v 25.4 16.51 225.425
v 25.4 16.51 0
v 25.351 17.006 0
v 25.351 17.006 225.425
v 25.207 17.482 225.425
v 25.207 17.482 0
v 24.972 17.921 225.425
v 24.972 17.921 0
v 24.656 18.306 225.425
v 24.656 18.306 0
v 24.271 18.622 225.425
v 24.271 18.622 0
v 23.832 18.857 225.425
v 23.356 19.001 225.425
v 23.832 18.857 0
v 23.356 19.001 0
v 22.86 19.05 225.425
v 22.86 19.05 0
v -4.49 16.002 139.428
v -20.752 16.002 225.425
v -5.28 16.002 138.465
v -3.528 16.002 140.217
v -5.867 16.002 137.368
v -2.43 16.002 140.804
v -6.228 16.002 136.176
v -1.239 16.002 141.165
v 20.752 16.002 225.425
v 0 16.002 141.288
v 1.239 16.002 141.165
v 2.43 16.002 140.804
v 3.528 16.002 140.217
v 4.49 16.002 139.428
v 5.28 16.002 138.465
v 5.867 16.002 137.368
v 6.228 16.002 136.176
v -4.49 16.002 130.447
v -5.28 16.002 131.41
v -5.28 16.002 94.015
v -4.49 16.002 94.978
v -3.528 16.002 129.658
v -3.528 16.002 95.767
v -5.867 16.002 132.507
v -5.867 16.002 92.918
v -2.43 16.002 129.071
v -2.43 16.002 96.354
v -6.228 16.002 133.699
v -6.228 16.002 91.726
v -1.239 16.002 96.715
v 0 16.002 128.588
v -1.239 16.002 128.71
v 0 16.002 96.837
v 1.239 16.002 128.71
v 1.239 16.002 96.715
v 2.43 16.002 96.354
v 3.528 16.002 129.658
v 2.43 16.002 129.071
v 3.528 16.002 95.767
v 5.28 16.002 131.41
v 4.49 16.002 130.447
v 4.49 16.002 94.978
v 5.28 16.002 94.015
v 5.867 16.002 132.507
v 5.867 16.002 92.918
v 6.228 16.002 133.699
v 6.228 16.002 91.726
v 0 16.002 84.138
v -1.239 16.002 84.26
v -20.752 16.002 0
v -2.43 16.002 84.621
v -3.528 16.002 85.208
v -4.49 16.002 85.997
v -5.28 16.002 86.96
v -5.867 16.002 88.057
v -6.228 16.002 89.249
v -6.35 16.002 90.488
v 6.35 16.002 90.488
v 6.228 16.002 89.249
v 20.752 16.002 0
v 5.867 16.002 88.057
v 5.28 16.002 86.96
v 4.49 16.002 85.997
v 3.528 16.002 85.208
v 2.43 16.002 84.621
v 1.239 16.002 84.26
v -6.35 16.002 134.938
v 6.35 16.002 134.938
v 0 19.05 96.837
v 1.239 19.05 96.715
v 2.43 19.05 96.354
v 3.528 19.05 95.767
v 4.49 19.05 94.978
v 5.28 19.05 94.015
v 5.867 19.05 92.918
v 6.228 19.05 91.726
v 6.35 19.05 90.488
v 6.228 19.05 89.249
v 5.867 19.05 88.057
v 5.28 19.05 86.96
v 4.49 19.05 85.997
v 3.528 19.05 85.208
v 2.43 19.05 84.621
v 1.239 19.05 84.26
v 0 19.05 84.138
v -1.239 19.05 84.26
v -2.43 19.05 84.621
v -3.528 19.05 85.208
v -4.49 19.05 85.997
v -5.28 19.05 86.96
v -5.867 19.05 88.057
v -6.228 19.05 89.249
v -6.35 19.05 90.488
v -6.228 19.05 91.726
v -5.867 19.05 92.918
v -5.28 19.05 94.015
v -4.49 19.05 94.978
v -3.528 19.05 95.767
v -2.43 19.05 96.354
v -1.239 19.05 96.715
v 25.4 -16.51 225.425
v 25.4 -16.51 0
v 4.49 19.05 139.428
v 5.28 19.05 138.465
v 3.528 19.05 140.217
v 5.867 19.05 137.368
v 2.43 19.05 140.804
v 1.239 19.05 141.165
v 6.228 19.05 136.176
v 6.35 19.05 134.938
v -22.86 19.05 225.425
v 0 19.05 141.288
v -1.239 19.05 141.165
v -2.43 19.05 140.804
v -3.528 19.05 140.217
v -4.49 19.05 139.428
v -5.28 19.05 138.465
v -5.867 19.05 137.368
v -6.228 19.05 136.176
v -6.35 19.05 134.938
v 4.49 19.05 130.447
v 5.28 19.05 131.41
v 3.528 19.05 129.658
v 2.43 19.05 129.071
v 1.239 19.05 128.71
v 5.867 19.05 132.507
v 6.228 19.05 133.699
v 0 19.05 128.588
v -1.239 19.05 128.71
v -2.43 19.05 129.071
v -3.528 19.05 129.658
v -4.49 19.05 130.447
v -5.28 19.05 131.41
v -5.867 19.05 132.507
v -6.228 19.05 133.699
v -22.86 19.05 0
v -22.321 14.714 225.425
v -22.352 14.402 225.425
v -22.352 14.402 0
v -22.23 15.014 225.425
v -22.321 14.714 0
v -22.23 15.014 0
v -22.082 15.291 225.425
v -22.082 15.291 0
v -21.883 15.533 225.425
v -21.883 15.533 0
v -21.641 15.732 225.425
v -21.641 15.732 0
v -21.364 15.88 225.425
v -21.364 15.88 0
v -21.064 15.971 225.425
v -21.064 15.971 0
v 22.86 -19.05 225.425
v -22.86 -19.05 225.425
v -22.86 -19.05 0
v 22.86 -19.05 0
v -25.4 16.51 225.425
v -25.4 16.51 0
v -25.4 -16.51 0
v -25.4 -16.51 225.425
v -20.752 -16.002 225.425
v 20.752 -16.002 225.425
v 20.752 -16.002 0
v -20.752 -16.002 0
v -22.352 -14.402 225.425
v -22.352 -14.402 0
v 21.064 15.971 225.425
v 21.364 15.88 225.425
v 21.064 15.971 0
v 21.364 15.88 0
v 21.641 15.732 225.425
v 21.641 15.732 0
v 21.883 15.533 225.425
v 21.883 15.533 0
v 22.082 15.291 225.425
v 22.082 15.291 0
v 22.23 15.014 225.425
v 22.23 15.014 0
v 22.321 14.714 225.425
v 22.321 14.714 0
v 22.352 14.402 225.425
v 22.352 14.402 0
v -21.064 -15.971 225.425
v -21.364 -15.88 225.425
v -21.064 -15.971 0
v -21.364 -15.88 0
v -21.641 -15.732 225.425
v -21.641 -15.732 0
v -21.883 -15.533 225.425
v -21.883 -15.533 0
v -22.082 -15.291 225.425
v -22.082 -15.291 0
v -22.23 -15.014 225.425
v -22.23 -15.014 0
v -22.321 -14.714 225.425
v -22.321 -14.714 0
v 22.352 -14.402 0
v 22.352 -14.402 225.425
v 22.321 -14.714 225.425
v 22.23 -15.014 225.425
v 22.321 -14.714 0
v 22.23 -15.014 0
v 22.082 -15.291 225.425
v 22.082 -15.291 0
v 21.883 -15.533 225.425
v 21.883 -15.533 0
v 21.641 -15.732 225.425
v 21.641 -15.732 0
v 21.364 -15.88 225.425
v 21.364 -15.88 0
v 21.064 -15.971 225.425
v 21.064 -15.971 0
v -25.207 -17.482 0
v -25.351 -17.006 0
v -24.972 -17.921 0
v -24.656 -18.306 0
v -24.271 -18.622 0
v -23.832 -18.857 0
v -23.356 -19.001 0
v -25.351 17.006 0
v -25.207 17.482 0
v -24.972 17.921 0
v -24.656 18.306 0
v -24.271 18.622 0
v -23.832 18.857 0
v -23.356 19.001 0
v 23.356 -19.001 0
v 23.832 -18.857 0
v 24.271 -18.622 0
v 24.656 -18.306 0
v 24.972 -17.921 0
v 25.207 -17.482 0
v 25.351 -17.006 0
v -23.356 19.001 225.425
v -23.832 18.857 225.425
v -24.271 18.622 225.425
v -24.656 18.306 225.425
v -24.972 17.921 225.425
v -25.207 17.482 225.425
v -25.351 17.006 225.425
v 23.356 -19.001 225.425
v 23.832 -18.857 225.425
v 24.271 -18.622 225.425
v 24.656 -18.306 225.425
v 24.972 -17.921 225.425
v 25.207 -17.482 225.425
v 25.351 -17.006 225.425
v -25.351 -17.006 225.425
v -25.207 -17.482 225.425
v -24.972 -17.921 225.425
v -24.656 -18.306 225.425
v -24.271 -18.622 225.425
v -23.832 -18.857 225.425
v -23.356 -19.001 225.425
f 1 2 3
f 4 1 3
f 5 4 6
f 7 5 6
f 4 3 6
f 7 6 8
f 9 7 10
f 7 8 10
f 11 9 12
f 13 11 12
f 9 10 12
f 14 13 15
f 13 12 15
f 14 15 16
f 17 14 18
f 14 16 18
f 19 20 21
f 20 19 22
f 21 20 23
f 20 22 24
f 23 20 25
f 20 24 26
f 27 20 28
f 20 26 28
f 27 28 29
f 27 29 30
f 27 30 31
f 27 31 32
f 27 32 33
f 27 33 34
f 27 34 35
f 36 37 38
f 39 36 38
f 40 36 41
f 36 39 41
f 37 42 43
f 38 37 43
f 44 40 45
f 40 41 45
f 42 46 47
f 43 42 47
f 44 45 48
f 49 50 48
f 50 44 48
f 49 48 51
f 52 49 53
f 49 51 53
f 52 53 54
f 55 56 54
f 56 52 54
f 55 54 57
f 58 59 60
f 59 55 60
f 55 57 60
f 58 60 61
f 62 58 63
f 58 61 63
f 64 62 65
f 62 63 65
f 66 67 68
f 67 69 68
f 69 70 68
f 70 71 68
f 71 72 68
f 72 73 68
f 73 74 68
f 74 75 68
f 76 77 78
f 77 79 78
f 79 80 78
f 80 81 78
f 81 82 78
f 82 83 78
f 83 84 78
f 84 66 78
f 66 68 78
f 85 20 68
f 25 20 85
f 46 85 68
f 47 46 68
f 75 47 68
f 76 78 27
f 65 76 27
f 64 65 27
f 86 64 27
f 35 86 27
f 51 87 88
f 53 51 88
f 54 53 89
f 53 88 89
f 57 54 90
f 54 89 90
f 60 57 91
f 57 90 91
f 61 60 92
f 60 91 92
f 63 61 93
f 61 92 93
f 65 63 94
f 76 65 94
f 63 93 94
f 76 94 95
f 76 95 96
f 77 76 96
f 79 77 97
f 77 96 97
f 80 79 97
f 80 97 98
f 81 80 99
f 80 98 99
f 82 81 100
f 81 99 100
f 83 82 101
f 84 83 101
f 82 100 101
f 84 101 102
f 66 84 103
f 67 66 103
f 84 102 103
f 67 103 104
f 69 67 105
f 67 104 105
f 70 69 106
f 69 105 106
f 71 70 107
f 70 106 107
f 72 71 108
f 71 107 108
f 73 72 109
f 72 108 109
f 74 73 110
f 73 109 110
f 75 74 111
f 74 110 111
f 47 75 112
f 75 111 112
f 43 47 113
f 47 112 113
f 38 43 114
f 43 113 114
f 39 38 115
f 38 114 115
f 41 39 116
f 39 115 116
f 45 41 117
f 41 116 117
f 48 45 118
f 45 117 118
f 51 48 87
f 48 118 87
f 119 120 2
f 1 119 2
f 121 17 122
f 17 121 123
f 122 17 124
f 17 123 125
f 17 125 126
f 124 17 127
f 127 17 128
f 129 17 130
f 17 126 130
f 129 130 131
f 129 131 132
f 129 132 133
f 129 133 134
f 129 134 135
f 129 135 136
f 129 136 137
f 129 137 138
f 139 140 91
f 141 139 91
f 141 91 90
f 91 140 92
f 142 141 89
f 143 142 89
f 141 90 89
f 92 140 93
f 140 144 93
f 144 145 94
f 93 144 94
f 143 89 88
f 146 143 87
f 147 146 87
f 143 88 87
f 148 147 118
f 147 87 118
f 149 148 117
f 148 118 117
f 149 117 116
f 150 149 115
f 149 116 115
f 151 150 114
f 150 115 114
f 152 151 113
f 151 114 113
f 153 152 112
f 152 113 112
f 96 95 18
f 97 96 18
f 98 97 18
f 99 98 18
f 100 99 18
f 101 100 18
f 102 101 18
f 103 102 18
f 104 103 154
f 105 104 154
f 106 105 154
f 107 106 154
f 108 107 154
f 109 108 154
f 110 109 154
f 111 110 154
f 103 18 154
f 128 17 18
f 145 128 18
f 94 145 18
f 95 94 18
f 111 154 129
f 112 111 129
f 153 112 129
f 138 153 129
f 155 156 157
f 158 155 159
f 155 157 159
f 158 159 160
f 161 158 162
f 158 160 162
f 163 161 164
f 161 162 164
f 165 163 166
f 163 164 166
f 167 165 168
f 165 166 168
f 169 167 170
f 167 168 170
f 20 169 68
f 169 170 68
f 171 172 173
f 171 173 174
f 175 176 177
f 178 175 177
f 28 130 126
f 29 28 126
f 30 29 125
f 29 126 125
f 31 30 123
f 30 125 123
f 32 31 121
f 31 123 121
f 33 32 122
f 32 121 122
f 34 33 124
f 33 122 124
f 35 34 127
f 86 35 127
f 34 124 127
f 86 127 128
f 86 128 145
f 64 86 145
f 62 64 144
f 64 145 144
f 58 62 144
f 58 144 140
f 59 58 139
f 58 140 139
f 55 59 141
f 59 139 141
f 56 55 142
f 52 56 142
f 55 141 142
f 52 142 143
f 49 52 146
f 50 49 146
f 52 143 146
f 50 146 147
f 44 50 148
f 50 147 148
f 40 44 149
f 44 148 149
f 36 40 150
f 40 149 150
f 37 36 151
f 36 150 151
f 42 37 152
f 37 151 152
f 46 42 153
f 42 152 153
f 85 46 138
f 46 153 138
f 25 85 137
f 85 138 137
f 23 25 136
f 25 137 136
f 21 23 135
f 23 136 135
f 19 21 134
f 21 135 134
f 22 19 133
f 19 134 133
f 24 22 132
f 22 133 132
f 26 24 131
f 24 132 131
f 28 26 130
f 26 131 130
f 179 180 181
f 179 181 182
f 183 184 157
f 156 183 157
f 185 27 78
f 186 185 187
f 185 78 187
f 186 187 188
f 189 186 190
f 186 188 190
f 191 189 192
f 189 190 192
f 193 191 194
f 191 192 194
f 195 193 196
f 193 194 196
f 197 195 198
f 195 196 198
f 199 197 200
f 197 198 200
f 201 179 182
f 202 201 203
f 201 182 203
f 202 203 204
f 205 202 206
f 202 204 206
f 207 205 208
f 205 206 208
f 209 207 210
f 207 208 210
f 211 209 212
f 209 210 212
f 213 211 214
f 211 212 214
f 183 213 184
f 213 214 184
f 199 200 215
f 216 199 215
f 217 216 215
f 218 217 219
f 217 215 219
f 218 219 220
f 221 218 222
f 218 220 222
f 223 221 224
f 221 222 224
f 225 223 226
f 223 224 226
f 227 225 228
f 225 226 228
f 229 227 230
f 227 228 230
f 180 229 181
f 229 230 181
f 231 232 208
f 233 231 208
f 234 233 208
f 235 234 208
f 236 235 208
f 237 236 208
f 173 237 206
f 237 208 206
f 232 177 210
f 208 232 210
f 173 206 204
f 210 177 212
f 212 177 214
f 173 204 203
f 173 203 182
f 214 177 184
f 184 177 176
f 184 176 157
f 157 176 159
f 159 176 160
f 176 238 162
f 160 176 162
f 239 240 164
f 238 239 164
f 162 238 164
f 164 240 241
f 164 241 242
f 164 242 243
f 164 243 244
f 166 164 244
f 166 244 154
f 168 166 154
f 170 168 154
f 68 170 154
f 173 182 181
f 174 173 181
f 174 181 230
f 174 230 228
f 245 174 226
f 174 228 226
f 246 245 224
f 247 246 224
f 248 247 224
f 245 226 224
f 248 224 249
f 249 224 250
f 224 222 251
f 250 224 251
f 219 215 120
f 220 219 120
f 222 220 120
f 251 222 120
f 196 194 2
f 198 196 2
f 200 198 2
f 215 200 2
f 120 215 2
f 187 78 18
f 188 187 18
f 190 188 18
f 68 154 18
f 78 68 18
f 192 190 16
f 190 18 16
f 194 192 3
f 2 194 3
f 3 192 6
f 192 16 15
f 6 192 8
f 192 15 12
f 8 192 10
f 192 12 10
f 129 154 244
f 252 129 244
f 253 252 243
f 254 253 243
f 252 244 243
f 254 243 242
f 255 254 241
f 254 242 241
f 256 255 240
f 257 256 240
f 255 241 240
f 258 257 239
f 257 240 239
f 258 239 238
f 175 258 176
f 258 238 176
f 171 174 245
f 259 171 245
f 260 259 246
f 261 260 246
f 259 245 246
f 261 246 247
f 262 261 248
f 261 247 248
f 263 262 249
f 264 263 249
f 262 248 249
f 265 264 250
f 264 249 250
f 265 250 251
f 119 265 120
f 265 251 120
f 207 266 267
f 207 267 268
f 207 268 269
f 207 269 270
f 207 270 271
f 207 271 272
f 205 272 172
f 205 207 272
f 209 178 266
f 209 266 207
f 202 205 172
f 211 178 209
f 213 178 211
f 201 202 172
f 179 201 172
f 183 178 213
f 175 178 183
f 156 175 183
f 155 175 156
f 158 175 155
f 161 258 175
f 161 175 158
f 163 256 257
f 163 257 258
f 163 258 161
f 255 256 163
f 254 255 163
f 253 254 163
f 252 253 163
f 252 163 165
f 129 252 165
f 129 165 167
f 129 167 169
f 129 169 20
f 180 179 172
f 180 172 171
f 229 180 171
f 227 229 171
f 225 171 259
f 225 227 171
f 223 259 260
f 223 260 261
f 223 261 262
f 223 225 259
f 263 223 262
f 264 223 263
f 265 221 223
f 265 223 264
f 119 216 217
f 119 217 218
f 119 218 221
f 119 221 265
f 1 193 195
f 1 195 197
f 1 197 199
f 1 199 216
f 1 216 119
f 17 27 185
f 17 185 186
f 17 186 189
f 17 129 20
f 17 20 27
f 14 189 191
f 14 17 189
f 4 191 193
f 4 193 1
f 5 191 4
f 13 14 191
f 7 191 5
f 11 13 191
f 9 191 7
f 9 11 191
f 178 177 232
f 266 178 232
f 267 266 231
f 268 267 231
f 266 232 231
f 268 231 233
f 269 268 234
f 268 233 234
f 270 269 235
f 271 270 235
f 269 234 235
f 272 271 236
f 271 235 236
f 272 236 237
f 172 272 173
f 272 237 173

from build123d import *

# Parameters (mm, degrees)
BOSS_EXTRUDE1_DEPTH = 225.425
SKETCH9_R           = 6.35
CUT_EXTRUDE2_DEPTH  = 3.048


with BuildPart() as part:
    # Sketch4 → Boss-Extrude1 (new body)
    with BuildSketch(Plane.XY):
        with BuildLine():
            Line((25.4, -16.51), (25.4, 16.51))
            ThreePointArc((25.4, 16.51), (24.656051224, 18.306051224), (22.86, 19.05))
            Line((22.86, 19.05), (-22.86, 19.05))
            ThreePointArc((-22.86, 19.05), (-24.656051224, 18.306051224), (-25.4, 16.51))
            Line((-25.4, 16.51), (-25.4, -16.51))
            ThreePointArc((-25.4, -16.51), (-24.656051224, -18.306051224), (-22.86, -19.05))
            Line((-22.86, -19.05), (22.86, -19.05))
            ThreePointArc((22.86, -19.05), (24.656051224, -18.306051224), (25.4, -16.51))
        make_face()
        with BuildLine():
            Line((22.352, 14.4018), (22.352, -14.4018))
            ThreePointArc((22.352, -14.4018), (21.883312271, -15.533312271), (20.7518, -16.002))
            Line((20.7518, -16.002), (-20.7518, -16.002))
            ThreePointArc((-20.7518, -16.002), (-21.883312271, -15.533312271), (-22.352, -14.4018))
            Line((-22.352, -14.4018), (-22.352, 14.4018))
            ThreePointArc((-22.352, 14.4018), (-21.883312271, 15.533312271), (-20.7518, 16.002))
            Line((-20.7518, 16.002), (20.7518, 16.002))
            ThreePointArc((20.7518, 16.002), (21.883312271, 15.533312271), (22.352, 14.4018))
        make_face(mode=Mode.SUBTRACT)
    extrude(amount=BOSS_EXTRUDE1_DEPTH)

    # Sketch9 → Cut-Extrude2 (cut)
    with BuildSketch(Plane(origin=(0, 19.05, 0), x_dir=(1, 0, 0), z_dir=(0, 1, 0))):
        with Locations(Location((0, -134.9375, 0), (0, 0, 270))):
            Circle(SKETCH9_R)
        with Locations(Location((0, -90.4875, 0), (0, 0, 270))):
            Circle(SKETCH9_R)
    extrude(amount=-CUT_EXTRUDE2_DEPTH, mode=Mode.SUBTRACT)


solid = part.part
